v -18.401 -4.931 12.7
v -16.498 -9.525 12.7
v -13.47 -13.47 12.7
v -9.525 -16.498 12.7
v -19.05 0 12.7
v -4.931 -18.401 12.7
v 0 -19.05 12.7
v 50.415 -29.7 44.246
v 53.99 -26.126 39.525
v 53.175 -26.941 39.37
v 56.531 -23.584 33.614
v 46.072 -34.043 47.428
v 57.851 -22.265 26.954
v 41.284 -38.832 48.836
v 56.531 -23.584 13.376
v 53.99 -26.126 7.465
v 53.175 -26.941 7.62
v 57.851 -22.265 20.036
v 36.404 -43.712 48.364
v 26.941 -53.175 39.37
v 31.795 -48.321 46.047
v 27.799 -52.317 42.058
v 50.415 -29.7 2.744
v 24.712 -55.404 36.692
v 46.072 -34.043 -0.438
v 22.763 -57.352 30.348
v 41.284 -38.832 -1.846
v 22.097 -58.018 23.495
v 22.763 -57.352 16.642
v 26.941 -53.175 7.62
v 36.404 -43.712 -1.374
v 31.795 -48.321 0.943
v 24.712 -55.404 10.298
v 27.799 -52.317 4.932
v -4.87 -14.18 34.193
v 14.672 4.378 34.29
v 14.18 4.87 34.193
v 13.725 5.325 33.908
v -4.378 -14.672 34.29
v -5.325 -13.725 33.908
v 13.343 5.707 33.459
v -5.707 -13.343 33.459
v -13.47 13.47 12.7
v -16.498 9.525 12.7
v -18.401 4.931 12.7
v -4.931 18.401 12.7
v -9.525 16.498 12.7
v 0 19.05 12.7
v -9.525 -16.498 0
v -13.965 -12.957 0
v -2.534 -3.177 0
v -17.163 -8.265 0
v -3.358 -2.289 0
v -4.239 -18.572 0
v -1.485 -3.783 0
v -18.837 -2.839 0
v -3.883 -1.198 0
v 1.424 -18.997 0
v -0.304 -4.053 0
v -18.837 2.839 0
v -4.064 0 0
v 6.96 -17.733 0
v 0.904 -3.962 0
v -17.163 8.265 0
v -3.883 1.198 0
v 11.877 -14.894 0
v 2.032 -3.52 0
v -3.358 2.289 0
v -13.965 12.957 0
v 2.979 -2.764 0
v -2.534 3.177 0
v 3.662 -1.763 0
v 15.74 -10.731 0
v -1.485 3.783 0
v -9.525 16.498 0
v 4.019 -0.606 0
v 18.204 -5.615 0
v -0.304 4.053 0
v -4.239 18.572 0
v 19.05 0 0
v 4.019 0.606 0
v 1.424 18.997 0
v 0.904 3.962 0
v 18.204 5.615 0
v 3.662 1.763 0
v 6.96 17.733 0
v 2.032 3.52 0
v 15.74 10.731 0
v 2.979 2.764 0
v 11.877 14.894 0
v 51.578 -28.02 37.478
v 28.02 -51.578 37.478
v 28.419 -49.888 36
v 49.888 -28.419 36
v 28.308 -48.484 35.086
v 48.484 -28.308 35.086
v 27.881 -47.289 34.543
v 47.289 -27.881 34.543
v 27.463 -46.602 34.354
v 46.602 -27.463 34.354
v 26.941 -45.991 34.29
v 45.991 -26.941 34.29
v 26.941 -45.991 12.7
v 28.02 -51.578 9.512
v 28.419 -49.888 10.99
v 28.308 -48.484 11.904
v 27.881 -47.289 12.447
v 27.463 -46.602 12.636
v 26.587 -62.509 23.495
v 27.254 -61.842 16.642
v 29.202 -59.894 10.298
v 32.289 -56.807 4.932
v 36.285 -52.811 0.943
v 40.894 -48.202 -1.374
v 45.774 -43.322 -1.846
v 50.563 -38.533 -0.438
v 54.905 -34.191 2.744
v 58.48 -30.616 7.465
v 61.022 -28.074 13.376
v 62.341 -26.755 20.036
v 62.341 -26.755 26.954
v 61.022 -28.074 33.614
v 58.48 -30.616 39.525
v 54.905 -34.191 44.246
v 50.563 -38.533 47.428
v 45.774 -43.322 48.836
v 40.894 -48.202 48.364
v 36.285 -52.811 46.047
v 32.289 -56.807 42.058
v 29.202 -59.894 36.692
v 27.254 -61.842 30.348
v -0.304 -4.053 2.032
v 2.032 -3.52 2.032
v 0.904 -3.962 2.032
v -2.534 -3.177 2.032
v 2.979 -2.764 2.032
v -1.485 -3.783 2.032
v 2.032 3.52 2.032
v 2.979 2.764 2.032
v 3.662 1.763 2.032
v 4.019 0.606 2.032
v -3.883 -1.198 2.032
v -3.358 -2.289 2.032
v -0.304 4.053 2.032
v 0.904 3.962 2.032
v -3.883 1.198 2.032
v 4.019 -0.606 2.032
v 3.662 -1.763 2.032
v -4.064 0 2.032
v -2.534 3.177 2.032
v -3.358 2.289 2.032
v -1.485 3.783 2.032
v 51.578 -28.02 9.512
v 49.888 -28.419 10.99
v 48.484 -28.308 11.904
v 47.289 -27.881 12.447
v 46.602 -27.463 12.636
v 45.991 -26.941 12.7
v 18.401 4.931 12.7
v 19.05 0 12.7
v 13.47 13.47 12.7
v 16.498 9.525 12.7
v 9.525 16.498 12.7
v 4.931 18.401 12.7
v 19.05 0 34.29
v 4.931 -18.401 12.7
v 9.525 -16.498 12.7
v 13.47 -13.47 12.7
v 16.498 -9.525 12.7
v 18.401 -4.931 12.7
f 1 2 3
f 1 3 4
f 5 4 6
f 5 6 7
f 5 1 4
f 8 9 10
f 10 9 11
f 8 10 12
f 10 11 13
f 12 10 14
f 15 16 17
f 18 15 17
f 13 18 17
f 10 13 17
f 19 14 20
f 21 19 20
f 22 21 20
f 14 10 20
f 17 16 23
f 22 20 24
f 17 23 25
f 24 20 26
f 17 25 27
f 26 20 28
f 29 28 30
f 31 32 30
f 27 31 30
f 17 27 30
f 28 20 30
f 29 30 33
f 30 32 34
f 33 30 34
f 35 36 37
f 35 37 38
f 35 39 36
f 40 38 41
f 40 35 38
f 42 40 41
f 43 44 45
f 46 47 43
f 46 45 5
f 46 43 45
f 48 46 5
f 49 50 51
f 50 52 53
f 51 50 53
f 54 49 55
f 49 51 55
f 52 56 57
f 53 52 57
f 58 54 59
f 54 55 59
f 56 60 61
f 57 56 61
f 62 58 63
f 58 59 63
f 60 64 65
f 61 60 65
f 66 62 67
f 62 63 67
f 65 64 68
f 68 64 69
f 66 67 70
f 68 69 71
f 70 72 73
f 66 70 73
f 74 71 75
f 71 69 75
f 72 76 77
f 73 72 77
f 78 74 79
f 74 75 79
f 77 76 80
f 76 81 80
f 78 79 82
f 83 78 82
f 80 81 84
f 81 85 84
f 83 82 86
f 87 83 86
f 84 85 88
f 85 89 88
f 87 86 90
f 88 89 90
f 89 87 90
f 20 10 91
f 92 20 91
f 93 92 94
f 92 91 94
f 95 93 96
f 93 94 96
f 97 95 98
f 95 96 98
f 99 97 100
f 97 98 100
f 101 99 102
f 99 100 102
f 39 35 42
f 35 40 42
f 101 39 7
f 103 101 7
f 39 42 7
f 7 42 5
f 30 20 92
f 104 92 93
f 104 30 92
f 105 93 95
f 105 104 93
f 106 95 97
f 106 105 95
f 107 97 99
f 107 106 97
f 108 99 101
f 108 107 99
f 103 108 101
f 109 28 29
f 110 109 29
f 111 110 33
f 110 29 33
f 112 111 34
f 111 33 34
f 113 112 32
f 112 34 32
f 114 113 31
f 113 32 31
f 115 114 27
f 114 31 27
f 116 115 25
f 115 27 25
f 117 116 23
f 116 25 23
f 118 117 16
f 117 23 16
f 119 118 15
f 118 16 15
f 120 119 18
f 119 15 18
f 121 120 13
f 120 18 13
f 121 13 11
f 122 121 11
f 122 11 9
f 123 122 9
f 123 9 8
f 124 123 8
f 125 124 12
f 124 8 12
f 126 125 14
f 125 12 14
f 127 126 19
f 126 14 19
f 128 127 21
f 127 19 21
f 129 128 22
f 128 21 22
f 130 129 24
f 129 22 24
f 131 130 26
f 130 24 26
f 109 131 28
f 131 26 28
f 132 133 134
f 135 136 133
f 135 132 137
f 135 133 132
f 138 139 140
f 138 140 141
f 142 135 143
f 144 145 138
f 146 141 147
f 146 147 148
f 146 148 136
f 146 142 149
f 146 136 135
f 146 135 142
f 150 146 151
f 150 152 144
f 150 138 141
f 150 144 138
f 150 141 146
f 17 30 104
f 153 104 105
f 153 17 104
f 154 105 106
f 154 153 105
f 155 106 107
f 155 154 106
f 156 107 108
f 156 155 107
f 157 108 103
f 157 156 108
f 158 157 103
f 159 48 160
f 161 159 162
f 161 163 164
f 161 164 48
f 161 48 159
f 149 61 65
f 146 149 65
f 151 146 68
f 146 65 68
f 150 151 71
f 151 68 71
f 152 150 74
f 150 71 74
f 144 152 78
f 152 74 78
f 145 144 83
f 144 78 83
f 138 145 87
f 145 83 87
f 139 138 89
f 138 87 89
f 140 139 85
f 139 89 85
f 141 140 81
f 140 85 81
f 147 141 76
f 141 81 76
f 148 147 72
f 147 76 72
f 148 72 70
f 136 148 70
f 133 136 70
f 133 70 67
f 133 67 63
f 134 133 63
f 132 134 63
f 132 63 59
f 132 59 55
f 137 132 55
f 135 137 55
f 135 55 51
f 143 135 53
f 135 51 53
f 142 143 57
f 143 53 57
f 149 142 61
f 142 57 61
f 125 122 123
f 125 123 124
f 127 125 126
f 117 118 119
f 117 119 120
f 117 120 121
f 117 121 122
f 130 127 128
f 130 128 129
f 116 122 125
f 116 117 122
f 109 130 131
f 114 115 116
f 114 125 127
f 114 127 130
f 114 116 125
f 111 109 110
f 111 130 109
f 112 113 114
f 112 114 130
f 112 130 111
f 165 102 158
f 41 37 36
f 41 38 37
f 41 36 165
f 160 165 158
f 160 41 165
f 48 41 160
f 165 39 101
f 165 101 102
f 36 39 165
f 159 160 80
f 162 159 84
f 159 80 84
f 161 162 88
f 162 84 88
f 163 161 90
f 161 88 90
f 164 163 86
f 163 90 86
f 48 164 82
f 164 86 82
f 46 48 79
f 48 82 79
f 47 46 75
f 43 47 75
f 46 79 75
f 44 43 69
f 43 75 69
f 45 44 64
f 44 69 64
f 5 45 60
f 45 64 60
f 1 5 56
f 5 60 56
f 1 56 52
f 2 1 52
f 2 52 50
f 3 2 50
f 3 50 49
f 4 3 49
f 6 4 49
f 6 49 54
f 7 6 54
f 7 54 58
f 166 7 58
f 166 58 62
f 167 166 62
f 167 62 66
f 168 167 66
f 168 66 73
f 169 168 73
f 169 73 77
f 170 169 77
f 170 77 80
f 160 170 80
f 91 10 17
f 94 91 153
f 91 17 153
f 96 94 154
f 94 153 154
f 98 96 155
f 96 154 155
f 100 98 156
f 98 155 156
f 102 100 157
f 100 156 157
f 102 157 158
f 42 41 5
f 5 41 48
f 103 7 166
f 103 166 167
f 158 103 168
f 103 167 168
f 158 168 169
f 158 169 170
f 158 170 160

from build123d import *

# Parameters (mm, degrees)
SKETCH1_R           = 19.05
BOSS_EXTRUDE1_DEPTH = 12.7
BOSS_EXTRUDE2_DEPTH = 21.59
SKETCH4_W           = 21.59
SKETCH4_H           = 26.940768364
BOSS_EXTRUDE3_DEPTH = 43.18
CUT_EXTRUDE1_DEPTH  = 43.18
FILLET2_R           = 2.54
SKETCH6_R           = 25.4
BOSS_EXTRUDE4_DEPTH = 6.35
FILLET5_R           = 5.08
SKETCH7_R           = 4.064
CUT_EXTRUDE2_DEPTH  = 2.032


with BuildPart() as part:
    # Sketch1 → Boss-Extrude1 (new body)
    with BuildSketch(Plane.XY):
        Circle(SKETCH1_R)
    extrude(amount=BOSS_EXTRUDE1_DEPTH)

    # Sketch2 → Boss-Extrude2 (add)
    with BuildSketch(Plane.XY.offset(12.7)):
        Polygon((-19.05, 0), (0, -19.05), (19.05, 0), (0, 19.05), align=None)
    extrude(amount=BOSS_EXTRUDE2_DEPTH)

    # Sketch4 → Boss-Extrude3 (add)
    with BuildSketch(Plane(origin=(9.525, -9.525, 0), x_dir=(0, 0, -1), z_dir=(0.7071067811865477, -0.7071067811865475, 0))):
        with Locations((-23.495, 0)):
            Rectangle(SKETCH4_W, SKETCH4_H)
    extrude(amount=BOSS_EXTRUDE3_DEPTH)

    # Sketch5 → Cut-Extrude1 (cut)
    with BuildSketch(Plane(origin=(9.525, 9.525, 0), x_dir=(0, 0, -1), z_dir=(0.7071067811865475, 0.7071067811865476, 0))):
        Polygon((-34.29, -6.155864654), (-12.7, 13.470384182), (-34.29, 13.470384182), align=None)
    extrude(amount=-CUT_EXTRUDE1_DEPTH, mode=Mode.SUBTRACT)

    # Fillet2
    fillet2_edges = [part.edges().sort_by_distance(p)[0] for p in [
        (4.352853641, -4.352853641, 34.29),
    ]]
    fillet(fillet2_edges, radius=FILLET2_R)

    # Sketch6 → Boss-Extrude4 (add)
    with BuildSketch(Plane(origin=(40.057870812, -40.057870812, 0), x_dir=(0, 0, -1), z_dir=(0.7071067811865477, -0.7071067811865475, 0))):
        with Locations(Location((-23.495, 0, 0), (0, 0, 270))):
            Circle(SKETCH6_R)
    extrude(amount=BOSS_EXTRUDE4_DEPTH)

    # Fillet5
    fillet5_edges = [part.edges().sort_by_distance(p)[0] for p in [
        (40.057870812, -40.057870812, 34.29),
        (30.532870812, -49.582870812, 23.495),
        (40.057870812, -40.057870812, 12.7),
        (49.582870812, -30.532870812, 23.495),
    ]]
    fillet(fillet5_edges, radius=FILLET5_R)

    # Sketch7 → Cut-Extrude2 (cut)
    with BuildSketch(Plane(origin=(0, 0, 0), x_dir=(-1, 0, 0), z_dir=(0, 0, -1))):
        Circle(SKETCH7_R)
    extrude(amount=-CUT_EXTRUDE2_DEPTH, mode=Mode.SUBTRACT)


solid = part.part
